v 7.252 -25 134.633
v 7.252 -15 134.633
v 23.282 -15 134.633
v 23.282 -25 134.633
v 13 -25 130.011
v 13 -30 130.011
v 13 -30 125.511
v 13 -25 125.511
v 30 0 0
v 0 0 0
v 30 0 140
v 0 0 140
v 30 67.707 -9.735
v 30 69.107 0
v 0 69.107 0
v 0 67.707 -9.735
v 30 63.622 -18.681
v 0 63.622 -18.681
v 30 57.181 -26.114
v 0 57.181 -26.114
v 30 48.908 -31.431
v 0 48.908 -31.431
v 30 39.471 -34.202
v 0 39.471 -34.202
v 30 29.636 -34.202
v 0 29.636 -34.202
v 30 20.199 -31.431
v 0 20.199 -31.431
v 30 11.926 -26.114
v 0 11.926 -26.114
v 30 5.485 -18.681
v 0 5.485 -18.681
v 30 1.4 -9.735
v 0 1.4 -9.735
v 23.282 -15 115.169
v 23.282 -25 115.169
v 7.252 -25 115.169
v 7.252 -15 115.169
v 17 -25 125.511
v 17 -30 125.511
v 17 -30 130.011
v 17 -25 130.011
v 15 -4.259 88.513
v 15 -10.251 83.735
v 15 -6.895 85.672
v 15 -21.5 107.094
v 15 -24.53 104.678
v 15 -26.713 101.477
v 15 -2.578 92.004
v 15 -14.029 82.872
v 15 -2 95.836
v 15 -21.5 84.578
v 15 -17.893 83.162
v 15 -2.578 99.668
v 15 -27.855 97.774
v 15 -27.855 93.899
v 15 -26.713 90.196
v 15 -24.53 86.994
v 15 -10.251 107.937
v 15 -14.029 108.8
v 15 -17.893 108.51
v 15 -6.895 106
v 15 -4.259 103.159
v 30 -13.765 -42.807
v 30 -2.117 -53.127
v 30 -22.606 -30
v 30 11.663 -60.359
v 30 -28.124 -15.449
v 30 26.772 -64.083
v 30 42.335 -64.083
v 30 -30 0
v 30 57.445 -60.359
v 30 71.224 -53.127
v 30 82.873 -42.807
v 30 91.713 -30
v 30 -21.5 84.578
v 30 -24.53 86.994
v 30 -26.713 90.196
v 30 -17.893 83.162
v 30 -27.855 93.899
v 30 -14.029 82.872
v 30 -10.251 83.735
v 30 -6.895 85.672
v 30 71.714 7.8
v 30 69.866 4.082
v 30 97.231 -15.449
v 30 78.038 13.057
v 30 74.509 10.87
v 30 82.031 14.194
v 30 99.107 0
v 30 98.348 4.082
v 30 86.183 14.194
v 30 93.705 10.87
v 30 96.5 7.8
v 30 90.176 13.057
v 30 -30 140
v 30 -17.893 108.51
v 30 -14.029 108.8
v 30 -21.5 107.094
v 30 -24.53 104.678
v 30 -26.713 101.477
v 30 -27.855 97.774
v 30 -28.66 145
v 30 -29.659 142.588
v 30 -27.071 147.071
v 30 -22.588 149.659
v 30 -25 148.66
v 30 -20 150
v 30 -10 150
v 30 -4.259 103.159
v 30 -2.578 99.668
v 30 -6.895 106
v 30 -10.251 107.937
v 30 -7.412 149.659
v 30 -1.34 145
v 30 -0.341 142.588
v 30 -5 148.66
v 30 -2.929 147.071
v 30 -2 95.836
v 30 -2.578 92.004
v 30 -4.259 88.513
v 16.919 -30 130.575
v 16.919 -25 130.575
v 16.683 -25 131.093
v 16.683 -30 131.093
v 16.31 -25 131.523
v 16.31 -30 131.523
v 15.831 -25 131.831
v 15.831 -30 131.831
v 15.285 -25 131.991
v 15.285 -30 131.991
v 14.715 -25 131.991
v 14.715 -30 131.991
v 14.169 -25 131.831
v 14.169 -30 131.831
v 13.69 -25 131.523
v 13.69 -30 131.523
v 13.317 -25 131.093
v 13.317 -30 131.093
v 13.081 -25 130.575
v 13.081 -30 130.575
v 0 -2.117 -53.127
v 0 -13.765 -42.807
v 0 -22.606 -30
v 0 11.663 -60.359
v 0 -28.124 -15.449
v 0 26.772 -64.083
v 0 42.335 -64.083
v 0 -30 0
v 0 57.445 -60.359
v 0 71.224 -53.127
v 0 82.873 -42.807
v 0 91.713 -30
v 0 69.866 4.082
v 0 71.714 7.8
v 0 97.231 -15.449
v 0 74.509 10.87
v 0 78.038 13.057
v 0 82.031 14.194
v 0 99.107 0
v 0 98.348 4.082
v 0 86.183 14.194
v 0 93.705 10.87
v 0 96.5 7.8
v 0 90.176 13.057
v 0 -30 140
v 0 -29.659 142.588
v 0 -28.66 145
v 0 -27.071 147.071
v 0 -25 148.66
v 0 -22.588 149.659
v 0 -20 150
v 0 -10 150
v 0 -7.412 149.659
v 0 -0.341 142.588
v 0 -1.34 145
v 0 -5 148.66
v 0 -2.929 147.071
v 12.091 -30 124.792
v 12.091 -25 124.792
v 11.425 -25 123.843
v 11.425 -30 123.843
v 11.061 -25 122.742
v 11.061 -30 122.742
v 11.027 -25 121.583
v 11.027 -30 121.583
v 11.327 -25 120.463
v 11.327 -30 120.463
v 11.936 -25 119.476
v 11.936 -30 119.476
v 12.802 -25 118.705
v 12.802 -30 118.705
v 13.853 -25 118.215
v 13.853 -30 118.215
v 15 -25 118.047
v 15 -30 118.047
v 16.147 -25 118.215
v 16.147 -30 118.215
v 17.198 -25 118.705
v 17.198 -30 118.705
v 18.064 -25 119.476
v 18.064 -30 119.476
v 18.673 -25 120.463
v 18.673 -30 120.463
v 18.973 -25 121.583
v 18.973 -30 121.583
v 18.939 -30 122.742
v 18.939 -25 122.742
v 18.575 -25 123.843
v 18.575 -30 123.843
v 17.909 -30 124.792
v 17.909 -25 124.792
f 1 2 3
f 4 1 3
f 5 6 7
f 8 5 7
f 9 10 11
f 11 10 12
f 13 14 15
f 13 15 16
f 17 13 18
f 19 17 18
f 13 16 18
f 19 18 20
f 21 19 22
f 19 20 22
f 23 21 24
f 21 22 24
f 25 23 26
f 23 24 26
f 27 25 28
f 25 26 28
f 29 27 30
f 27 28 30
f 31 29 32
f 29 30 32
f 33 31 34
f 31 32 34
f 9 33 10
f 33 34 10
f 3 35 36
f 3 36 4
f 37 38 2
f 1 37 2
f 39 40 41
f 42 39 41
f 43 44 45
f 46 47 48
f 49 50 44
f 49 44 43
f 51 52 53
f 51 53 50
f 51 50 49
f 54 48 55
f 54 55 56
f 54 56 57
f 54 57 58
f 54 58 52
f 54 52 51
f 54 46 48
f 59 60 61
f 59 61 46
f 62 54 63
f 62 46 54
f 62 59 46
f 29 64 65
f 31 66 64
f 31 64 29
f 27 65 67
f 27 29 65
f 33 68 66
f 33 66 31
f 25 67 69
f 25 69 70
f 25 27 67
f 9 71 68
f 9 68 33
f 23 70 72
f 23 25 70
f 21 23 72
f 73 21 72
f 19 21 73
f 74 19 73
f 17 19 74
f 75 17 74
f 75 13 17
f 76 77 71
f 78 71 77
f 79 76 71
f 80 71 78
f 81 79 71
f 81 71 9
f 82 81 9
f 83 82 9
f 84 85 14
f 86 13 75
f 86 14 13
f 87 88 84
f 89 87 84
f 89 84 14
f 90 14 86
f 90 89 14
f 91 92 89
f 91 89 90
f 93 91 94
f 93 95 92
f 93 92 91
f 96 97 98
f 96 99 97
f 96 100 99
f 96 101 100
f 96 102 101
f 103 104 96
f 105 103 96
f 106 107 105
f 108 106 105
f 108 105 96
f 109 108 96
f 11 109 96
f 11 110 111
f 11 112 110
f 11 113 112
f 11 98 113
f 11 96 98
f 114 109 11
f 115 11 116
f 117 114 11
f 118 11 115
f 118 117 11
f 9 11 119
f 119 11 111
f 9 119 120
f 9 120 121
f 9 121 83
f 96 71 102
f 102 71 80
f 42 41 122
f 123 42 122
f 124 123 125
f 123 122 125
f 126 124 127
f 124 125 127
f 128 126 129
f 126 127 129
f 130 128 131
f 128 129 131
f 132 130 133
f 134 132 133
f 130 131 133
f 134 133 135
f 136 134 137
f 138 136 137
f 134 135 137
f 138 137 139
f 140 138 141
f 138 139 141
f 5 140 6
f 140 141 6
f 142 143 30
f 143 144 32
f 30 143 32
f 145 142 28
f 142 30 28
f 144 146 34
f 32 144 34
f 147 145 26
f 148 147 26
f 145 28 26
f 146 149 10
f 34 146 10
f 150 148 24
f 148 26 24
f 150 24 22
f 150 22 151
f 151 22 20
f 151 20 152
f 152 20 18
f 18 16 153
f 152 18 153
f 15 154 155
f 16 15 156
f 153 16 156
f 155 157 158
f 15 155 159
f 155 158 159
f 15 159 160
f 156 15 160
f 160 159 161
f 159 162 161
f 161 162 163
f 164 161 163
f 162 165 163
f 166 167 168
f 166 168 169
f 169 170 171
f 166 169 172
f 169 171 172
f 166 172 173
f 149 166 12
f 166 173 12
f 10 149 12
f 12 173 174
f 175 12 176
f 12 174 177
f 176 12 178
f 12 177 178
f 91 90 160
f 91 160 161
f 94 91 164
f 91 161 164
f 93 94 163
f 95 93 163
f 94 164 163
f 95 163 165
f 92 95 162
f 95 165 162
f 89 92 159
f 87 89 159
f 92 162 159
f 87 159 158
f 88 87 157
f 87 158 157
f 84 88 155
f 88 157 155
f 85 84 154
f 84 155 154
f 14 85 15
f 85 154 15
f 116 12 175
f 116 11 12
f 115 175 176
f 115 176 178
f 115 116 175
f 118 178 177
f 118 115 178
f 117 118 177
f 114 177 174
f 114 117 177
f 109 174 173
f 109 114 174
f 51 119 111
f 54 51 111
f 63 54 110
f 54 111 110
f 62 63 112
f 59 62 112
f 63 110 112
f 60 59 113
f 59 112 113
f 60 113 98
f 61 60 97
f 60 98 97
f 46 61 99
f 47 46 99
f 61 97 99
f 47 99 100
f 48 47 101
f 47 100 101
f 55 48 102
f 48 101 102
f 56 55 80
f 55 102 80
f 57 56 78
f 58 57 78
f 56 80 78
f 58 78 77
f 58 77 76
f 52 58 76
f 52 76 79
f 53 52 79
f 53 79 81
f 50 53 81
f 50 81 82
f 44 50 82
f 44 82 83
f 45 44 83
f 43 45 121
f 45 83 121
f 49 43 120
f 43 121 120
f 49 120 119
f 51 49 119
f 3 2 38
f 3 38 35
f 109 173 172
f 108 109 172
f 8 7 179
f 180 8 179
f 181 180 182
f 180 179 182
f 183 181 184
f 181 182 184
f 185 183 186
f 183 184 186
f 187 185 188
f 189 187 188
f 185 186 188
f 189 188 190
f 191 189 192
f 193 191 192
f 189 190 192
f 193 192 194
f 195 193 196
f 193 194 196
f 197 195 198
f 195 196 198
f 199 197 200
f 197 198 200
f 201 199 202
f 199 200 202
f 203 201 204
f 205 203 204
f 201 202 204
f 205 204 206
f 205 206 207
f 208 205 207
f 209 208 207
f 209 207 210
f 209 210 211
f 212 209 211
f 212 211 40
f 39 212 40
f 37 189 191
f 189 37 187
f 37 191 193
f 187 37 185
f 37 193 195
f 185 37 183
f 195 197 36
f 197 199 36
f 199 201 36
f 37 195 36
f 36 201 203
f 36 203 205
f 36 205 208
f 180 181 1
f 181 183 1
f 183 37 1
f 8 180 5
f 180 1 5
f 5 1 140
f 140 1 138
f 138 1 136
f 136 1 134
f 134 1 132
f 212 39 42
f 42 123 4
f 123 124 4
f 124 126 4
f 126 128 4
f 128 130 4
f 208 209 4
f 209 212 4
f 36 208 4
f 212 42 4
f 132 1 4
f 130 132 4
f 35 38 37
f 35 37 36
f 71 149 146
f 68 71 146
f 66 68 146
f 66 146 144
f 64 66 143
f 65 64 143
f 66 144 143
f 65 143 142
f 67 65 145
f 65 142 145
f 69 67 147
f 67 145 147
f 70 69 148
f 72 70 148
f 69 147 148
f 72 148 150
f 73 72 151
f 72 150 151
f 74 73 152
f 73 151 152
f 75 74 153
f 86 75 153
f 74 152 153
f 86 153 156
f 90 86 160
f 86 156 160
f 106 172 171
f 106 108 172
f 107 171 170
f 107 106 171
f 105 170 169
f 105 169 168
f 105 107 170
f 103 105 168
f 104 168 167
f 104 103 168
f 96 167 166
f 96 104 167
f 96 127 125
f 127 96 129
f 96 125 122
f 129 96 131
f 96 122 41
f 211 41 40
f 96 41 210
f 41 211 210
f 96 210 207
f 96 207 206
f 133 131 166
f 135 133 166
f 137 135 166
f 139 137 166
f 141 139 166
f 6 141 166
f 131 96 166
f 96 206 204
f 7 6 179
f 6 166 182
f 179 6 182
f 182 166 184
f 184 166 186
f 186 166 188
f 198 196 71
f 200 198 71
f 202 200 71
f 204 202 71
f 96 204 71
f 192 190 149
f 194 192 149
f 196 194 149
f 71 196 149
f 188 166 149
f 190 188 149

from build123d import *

# Parameters (mm, degrees)
F1_DEPTH = 30
F2_R     = 13
F3_DEPTH = 15
F5_DEPTH = 15
F6_W     = 16.029888
F6_H     = 19.464858
F7_DEPTH = 10
F8_R     = 10


with BuildPart() as f1:
    # F0 (on Right) → F1 (new body)
    with BuildSketch(Plane.YZ):
        with BuildLine():
            ThreePointArc((69.107138, 0), (34.553569, -34.553569), (0, 0))
            Line((0, 0), (0, 150))
            Line((0, 150), (-30, 150))
            Line((-30, 150), (-30, 0))
            ThreePointArc((-30, 0), (34.553569, -64.553569), (99.107138, 0))
            ThreePointArc((99.107138, 0), (84.107138, 14.337759), (69.107138, 0))
        make_face()
    extrude(amount=F1_DEPTH)

    # F2 (on face) → F3 (cut)
    with BuildSketch(Plane.YZ.offset(30)):
        with Locations((-15, 95.836063)):
            Circle(F2_R)
    extrude(amount=-F3_DEPTH, mode=Mode.SUBTRACT)

    # F4 (on face) → F5 (cut)
    with BuildSketch(Plane.XZ.offset(30)):
        with BuildLine():
            Line((13, 130.011459), (13, 125.511459))
            ThreePointArc((13, 125.511459), (15, 118.047357), (17, 125.511459))
            Line((17, 125.511459), (17, 130.011459))
            ThreePointArc((17, 130.011459), (15, 132.011459), (13, 130.011459))
        make_face()
    extrude(amount=-F5_DEPTH, mode=Mode.SUBTRACT)

    # F6 (on face) → F7 (cut)
    with BuildSketch(Plane.XZ.offset(15)):
        with Locations((15.266558, 124.901053)):
            Rectangle(F6_W, F6_H)
    extrude(amount=F7_DEPTH, mode=Mode.SUBTRACT)

    # F8
    f8_edges = [f1.edges().sort_by_distance(p)[0] for p in [
        (15, 0, 150),
        (15, -30, 150),
    ]]
    fillet(f8_edges, radius=F8_R)


solid = f1.part
